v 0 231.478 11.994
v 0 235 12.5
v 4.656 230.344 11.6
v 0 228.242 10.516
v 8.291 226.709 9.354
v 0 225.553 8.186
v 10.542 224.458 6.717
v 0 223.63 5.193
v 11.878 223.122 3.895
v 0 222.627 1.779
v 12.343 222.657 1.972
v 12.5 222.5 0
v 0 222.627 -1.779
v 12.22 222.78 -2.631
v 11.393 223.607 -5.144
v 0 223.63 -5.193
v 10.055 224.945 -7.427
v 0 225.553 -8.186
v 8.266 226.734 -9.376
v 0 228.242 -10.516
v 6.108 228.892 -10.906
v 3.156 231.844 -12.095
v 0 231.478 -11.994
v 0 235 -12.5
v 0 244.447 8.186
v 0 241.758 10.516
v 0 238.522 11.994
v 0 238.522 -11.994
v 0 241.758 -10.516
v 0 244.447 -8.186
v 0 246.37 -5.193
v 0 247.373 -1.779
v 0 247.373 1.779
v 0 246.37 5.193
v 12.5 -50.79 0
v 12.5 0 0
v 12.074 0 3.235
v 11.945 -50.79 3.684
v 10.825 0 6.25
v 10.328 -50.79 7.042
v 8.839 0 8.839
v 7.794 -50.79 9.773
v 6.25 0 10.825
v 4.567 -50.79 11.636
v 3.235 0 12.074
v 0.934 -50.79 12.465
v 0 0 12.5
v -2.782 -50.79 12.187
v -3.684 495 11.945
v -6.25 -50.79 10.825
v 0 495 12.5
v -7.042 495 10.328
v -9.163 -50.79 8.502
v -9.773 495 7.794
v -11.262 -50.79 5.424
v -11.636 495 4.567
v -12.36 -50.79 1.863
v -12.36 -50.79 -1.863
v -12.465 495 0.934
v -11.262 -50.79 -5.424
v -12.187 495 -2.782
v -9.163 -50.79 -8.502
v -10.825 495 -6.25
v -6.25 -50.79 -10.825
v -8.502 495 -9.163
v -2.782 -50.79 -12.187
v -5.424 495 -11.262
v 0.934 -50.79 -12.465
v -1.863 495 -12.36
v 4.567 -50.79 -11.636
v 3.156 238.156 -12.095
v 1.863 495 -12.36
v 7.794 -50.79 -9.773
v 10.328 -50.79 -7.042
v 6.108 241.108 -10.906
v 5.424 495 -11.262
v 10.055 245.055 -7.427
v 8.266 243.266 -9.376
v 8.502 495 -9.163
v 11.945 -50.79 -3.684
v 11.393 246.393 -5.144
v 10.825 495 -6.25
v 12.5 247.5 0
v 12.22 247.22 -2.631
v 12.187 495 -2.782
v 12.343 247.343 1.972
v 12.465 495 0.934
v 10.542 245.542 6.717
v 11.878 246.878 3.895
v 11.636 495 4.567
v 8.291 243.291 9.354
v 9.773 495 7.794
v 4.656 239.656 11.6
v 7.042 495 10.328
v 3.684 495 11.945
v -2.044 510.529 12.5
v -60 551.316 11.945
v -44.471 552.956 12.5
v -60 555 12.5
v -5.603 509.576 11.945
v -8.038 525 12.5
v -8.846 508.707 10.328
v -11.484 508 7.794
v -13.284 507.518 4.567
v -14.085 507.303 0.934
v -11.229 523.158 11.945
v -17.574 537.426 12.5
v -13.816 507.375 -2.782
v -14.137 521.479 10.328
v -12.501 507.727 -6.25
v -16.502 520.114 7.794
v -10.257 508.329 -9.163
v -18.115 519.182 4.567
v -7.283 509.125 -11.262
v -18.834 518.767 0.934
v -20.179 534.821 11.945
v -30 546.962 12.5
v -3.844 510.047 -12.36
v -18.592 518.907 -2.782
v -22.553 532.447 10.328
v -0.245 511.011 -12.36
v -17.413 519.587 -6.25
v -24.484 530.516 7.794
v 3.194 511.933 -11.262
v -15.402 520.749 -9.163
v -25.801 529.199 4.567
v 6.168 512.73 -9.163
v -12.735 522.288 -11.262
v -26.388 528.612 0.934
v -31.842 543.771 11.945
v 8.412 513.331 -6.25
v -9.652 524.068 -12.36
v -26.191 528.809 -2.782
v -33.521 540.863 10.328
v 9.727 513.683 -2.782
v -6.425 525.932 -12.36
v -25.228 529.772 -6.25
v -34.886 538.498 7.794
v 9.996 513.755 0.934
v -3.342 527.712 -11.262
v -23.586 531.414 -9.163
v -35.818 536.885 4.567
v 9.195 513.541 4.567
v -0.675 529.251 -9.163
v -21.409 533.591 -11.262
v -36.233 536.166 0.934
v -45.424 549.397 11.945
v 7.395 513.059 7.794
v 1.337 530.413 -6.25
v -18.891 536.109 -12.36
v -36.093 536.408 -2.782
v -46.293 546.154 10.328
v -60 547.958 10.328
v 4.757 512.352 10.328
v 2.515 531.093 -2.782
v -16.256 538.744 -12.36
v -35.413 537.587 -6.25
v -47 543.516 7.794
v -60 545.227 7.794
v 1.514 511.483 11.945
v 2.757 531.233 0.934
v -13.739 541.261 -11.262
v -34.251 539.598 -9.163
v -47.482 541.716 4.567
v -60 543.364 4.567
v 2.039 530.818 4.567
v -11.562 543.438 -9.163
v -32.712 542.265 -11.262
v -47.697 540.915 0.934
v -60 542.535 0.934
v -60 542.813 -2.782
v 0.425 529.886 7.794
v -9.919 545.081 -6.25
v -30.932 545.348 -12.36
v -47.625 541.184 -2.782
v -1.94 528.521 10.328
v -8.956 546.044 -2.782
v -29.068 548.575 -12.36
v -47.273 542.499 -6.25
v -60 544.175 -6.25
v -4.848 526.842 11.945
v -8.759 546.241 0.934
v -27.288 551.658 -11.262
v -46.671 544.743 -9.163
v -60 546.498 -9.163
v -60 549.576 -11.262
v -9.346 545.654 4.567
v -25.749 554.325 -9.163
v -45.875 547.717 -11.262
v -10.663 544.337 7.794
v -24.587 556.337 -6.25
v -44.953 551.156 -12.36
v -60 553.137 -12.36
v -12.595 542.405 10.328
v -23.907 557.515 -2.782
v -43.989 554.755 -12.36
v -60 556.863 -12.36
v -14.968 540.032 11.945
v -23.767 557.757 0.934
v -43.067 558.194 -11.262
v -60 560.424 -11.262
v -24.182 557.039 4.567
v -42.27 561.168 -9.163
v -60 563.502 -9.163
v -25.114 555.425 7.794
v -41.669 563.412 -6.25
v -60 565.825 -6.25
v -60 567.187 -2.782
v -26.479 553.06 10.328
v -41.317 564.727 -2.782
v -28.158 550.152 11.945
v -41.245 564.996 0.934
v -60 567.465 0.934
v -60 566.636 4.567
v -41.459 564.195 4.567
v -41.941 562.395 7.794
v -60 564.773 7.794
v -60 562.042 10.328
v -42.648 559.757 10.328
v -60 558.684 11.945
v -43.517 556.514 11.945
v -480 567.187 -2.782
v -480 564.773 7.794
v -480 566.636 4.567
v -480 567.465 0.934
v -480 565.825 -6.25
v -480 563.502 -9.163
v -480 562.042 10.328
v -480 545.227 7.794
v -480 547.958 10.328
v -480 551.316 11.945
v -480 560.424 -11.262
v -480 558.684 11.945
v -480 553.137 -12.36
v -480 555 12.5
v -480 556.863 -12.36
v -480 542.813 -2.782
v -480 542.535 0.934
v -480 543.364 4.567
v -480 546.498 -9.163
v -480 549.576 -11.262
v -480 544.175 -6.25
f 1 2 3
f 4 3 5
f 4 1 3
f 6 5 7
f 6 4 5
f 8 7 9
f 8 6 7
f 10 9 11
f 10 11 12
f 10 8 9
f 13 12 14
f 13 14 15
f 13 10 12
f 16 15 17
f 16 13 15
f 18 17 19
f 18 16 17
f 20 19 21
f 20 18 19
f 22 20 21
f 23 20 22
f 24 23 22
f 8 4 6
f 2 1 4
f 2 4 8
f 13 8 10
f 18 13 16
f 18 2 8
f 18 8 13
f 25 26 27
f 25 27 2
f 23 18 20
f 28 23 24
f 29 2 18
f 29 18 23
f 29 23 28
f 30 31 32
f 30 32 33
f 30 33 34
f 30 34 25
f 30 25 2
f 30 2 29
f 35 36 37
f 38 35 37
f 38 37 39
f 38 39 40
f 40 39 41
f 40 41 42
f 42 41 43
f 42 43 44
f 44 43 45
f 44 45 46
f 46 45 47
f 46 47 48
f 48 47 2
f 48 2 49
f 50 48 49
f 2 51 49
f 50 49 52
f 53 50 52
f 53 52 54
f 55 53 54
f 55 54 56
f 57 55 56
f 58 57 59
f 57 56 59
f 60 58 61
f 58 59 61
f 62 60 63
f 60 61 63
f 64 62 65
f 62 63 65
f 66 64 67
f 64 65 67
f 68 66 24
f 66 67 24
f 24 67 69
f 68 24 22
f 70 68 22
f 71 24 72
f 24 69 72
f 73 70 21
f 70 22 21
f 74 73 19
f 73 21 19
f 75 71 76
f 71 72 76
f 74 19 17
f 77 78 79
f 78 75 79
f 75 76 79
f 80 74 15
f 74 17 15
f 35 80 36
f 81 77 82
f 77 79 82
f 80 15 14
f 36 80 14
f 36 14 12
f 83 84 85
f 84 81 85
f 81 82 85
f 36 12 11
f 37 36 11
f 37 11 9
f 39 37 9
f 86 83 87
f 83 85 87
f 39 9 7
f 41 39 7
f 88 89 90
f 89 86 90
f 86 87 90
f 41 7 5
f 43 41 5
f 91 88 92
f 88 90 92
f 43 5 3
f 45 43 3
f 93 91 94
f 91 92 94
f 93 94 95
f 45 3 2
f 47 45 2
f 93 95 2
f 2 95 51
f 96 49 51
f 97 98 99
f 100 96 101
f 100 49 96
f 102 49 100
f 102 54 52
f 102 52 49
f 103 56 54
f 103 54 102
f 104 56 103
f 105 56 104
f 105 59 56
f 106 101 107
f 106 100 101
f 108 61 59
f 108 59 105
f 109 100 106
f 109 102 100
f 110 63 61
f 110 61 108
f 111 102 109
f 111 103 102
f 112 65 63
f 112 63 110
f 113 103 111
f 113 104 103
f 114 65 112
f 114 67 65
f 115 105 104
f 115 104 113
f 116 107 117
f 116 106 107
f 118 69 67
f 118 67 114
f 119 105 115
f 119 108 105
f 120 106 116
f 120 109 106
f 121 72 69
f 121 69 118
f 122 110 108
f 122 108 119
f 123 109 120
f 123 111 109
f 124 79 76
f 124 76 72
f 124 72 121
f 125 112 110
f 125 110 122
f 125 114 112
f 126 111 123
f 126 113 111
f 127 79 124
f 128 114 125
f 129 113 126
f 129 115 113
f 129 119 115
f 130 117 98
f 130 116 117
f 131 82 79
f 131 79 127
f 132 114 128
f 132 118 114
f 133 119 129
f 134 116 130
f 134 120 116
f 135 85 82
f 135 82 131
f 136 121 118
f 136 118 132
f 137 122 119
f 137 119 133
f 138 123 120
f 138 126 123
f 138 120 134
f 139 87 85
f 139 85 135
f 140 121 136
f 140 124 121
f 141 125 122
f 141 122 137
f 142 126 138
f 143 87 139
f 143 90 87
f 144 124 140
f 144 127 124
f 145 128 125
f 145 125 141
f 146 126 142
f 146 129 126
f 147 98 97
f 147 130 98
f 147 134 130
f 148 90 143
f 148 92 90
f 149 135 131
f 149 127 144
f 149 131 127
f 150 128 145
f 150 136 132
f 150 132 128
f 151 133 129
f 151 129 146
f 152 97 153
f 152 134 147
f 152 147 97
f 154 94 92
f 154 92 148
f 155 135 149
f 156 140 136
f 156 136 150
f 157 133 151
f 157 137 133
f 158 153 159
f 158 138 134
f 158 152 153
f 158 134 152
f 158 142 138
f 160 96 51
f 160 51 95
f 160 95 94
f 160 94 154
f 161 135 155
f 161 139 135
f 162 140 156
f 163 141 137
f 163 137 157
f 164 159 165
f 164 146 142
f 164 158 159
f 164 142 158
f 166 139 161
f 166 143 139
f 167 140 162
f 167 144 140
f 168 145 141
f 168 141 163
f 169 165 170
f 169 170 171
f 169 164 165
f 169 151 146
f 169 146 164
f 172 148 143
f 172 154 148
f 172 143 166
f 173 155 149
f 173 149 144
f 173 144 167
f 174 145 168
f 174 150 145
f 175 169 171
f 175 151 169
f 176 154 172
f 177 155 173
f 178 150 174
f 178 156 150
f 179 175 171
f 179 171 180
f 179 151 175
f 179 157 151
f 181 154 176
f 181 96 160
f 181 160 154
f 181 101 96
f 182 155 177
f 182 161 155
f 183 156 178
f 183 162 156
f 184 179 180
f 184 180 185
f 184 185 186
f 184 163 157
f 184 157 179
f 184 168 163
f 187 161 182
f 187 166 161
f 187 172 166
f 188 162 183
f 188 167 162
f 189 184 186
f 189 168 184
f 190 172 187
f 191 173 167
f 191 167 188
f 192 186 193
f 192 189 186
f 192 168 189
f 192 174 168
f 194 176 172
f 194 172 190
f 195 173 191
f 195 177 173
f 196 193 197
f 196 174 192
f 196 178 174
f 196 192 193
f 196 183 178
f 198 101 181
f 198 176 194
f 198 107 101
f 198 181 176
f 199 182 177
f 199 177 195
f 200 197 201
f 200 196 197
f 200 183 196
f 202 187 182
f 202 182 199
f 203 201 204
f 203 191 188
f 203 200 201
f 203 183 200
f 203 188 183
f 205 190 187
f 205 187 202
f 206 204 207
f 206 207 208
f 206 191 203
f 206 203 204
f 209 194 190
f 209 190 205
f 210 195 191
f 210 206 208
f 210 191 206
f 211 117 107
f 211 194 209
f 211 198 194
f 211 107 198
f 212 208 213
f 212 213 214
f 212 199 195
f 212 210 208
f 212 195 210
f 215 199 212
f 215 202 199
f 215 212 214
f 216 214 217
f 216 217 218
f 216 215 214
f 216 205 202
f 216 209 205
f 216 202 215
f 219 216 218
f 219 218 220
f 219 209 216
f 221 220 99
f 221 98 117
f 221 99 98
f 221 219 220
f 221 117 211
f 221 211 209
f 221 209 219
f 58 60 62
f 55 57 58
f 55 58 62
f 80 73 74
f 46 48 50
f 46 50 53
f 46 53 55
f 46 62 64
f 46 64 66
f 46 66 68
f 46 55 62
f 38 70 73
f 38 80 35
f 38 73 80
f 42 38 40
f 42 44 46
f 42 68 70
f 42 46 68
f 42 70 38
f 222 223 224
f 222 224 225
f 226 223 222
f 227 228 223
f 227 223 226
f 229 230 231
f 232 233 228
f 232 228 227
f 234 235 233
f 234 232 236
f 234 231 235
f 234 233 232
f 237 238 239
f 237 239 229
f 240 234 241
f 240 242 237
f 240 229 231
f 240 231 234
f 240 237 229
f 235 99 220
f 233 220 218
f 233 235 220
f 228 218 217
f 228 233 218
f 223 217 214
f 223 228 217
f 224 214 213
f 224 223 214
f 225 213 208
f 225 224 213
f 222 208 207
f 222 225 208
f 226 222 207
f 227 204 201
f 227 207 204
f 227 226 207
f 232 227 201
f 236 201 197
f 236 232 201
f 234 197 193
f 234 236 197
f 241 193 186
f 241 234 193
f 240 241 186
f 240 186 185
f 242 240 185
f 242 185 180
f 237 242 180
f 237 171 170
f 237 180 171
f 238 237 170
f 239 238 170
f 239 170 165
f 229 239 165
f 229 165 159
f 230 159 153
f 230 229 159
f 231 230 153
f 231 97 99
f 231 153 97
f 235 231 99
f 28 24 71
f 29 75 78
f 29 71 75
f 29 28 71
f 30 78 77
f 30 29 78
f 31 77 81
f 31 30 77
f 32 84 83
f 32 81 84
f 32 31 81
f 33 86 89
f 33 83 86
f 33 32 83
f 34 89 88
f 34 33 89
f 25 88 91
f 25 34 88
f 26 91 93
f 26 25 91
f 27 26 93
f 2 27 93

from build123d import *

# Parameters (mm, degrees)
SWEEP1_PROFILE_R    = 12.5
SKETCH2_R           = 12.5
BOSS_EXTRUDE4_DEPTH = 50.79
SKETCH11_R          = 12.5
CUT_EXTRUDE2_DEPTH  = 50.79


with BuildPart() as part:
    # Sweep1: sweep along a path in Sketch1
    with BuildLine(Plane.XY) as sweep1_path:
        Line((0, 0), (0, 495))
        ThreePointArc((0, 495), (-17.573593129, 537.426406871), (-60, 555))
        Line((-60, 555), (-480, 555))
    # Sweep1 profile (on start of the path) → Sweep1 (sweep)
    with BuildSketch(Plane.ZX):
        Circle(SWEEP1_PROFILE_R)
    sweep(path=sweep1_path.line)

    # Sketch2 → Boss-Extrude4 (add)
    with BuildSketch(Plane.XZ):
        Circle(SKETCH2_R)
    extrude(amount=BOSS_EXTRUDE4_DEPTH)

    # Sketch11 → Cut-Extrude2 (cut)
    with BuildSketch(Plane(origin=(0, 0, 0), x_dir=(0, 0, -1), z_dir=(1, 0, 0))):
        with Locations((0, 235)):
            Circle(SKETCH11_R)
    extrude(amount=CUT_EXTRUDE2_DEPTH, mode=Mode.SUBTRACT)


solid = part.part
